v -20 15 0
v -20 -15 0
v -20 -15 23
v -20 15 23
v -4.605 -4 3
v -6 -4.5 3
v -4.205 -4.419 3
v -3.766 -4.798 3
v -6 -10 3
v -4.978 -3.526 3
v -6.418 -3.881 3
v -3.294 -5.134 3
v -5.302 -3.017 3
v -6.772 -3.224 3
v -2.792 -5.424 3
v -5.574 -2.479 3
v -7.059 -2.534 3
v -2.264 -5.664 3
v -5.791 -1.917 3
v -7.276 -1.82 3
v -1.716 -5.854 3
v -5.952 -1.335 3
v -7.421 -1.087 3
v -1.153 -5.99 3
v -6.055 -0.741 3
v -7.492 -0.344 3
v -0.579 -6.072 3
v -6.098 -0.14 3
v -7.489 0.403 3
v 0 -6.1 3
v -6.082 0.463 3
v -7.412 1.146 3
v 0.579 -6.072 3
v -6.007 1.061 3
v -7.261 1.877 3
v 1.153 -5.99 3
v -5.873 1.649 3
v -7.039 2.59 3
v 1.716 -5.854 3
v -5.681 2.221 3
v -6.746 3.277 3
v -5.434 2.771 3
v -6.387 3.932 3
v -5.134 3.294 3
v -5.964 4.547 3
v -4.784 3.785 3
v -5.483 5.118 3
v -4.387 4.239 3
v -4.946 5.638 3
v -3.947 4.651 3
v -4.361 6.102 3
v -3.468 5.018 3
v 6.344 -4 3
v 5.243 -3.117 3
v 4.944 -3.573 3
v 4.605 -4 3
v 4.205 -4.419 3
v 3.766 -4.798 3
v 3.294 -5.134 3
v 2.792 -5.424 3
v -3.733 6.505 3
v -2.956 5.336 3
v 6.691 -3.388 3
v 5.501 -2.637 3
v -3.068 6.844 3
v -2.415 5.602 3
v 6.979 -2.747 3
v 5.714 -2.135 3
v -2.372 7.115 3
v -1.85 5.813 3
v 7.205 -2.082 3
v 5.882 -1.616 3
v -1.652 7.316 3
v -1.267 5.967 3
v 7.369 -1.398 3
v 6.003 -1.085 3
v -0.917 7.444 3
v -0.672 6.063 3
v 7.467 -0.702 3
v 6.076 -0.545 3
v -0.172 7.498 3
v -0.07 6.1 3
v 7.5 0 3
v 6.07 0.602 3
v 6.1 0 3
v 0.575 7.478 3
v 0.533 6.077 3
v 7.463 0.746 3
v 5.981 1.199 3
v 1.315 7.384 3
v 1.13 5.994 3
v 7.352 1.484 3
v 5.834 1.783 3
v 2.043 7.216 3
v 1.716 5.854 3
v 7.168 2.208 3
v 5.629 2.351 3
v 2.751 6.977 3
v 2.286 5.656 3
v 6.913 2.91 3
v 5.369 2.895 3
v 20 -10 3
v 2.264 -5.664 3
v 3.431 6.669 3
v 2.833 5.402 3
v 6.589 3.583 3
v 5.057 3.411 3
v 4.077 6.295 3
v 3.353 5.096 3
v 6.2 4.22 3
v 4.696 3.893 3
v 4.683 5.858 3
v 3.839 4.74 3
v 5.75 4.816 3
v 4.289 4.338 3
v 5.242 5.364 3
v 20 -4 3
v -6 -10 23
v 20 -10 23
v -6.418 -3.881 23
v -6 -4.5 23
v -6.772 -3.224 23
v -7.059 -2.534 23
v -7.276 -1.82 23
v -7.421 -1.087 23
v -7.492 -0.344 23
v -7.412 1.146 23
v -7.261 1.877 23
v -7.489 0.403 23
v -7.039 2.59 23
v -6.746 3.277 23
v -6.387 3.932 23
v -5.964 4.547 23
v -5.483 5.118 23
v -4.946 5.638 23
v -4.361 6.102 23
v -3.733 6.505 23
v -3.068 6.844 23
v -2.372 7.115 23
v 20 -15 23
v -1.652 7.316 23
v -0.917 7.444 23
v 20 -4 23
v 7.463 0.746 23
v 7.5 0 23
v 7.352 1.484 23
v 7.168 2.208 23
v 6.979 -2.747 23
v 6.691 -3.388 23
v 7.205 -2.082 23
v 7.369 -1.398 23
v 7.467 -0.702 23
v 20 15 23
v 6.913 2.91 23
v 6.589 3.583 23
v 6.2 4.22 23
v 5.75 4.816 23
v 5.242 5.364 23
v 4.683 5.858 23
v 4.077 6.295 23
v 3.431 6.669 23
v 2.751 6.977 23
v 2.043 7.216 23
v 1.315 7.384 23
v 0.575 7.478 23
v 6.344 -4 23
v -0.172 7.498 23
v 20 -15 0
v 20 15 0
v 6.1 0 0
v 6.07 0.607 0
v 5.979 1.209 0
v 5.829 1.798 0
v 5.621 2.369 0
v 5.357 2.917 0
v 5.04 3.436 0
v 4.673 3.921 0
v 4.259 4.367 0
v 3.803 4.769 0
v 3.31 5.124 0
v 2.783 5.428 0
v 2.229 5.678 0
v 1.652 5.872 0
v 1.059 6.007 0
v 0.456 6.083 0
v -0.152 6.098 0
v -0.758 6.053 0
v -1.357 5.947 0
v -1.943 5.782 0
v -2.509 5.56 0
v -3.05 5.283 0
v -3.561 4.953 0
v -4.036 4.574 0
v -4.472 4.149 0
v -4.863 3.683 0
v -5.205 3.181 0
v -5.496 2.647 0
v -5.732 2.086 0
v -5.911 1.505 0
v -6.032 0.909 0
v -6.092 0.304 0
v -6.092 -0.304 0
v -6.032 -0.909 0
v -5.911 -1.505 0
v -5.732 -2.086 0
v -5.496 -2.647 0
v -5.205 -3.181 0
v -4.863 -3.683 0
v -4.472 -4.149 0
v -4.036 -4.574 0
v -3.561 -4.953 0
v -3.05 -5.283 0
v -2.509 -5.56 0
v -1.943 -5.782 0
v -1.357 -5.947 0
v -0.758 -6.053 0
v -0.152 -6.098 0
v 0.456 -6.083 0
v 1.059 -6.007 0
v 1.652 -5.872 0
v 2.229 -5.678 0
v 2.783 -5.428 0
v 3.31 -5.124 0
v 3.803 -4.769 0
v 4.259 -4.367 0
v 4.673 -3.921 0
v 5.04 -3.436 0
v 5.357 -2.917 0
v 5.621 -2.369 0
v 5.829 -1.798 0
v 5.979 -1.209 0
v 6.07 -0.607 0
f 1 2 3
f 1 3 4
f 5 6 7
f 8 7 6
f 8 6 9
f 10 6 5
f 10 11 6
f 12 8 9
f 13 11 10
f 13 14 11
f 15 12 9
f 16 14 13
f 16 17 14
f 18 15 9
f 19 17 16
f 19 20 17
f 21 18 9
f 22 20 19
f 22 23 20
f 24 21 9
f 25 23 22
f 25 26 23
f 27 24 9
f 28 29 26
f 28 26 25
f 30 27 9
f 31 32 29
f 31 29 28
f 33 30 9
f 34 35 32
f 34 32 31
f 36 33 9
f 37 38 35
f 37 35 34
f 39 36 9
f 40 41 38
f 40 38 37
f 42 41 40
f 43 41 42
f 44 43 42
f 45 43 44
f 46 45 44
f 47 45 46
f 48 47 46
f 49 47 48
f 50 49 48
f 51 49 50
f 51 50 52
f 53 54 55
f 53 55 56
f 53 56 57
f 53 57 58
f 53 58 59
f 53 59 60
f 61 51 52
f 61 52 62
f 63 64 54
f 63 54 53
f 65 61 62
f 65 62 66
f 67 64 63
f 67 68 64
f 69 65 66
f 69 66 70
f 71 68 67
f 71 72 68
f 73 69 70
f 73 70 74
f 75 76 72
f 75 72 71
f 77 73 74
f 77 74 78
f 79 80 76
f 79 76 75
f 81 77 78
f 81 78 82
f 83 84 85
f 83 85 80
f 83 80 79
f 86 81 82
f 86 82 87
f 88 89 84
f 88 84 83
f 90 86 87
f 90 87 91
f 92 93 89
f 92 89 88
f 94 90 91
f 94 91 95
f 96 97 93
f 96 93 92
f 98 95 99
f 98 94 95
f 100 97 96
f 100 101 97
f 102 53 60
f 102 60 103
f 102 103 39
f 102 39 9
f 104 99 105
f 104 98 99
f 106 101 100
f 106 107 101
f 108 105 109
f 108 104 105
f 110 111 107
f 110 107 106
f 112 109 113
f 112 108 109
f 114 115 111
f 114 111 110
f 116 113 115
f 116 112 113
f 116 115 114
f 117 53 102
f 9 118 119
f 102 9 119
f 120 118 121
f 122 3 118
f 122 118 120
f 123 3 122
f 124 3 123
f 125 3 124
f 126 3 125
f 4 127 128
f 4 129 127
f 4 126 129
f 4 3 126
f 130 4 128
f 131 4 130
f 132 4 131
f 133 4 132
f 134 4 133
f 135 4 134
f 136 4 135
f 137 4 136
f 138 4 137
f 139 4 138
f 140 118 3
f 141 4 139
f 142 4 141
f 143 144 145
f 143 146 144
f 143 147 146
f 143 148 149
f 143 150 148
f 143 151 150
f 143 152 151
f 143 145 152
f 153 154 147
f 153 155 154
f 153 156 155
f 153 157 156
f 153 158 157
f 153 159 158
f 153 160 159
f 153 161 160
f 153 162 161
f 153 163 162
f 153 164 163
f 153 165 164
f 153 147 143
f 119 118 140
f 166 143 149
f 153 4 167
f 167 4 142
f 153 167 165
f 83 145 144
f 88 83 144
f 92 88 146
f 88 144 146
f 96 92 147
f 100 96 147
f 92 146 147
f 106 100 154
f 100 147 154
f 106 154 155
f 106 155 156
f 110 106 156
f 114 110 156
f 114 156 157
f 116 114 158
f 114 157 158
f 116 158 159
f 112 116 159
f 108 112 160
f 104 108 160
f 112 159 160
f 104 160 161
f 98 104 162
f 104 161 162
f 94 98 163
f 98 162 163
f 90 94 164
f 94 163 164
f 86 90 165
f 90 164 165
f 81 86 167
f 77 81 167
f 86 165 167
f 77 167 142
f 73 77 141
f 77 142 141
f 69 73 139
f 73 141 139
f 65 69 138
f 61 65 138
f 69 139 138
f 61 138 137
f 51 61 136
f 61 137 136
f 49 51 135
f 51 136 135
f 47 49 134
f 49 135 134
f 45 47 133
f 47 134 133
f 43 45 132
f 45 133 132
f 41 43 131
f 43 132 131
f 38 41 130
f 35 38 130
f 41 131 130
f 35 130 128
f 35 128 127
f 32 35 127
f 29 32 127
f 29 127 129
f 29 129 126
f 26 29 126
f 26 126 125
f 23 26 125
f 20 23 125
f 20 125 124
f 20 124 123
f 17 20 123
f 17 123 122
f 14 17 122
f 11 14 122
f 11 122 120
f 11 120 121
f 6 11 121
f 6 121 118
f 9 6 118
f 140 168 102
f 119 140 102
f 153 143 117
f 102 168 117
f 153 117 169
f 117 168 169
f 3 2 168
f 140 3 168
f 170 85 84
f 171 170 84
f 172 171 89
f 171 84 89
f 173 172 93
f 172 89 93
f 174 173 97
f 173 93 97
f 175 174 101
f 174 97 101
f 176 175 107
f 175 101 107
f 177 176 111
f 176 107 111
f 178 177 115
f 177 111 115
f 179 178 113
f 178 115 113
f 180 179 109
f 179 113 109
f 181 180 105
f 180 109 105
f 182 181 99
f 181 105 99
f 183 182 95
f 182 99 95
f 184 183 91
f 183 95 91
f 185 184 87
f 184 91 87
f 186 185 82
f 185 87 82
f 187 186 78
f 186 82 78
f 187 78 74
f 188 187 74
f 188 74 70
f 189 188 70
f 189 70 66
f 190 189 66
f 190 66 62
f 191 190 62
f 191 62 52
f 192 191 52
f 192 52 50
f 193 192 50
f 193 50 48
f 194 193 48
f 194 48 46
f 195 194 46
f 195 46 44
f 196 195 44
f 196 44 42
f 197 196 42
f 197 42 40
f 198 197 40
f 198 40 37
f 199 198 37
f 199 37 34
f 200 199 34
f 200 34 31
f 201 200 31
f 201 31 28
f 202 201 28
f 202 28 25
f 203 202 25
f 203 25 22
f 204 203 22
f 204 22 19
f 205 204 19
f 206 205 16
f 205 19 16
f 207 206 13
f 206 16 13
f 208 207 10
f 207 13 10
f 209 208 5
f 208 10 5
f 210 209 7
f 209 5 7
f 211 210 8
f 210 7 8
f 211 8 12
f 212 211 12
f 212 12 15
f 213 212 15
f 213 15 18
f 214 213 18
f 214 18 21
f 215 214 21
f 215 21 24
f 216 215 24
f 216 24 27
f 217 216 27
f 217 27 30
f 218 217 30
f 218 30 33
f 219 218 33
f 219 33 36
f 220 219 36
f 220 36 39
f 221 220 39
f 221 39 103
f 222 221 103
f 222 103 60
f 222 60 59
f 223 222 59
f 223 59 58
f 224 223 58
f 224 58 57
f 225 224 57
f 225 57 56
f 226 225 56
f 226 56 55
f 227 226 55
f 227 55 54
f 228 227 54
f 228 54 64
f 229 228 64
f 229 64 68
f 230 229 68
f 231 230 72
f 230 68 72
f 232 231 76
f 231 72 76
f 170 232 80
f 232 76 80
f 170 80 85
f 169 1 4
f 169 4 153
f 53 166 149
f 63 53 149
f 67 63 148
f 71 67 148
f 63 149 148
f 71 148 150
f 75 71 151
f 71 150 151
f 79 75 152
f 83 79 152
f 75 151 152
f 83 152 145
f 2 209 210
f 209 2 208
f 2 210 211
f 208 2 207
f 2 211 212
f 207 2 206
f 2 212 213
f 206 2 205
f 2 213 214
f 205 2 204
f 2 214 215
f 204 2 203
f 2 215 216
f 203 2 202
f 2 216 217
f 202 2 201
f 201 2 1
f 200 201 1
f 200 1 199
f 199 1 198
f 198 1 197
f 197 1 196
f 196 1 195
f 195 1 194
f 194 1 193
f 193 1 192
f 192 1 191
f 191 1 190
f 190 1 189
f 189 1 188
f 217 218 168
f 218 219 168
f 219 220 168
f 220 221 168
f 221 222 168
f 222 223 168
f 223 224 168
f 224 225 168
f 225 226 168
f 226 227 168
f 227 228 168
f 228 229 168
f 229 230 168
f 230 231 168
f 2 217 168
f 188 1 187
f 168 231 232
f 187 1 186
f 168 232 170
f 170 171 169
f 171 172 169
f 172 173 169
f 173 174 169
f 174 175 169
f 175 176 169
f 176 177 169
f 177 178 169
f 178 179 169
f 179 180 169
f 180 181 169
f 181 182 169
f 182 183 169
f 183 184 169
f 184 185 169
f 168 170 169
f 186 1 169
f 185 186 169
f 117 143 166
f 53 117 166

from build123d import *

# Parameters (mm, degrees)
SKETCH1_W           = 40
SKETCH1_H           = 30
BOSS_EXTRUDE1_DEPTH = 23
SKETCH3_R           = 6.1
CUT_EXTRUDE1_DEPTH  = 24
CUT_EXTRUDE2_DEPTH  = 20


with BuildPart() as part:
    # Sketch1 → Boss-Extrude1 (new body)
    with BuildSketch(Plane.XY):
        Rectangle(SKETCH1_W, SKETCH1_H)
    extrude(amount=BOSS_EXTRUDE1_DEPTH)

    # Sketch3 → Cut-Extrude1 (cut, through all)
    with BuildSketch(Plane.XY.offset(23)):
        Circle(SKETCH3_R)
    extrude(amount=-CUT_EXTRUDE1_DEPTH, mode=Mode.SUBTRACT)

    # Sketch4 → Cut-Extrude2 (cut)
    with BuildSketch(Plane.XY.offset(23)):
        with BuildLine():
            Line((-6, -4.5), (-6, -4))
            Line((-6, -4), (-4.605431576, -4))
            ThreePointArc((-4.605431576, -4), (-2.135048874, 5.714154907), (6.1, 0))
            ThreePointArc((6.1, 0), (5.714154907, -2.135048874), (4.605431576, -4))
            Line((4.605431576, -4), (6.34428877, -4))
            ThreePointArc((6.34428877, -4), (7.205281597, -2.081806214), (7.5, 0))
            ThreePointArc((7.5, 0), (-2.371708245, 7.115124735), (-6, -4.5))
        make_face()
        with BuildLine():
            Line((-4.605431576, -4), (-6, -4))
            Line((-6, -4), (-6, -4.5))
            ThreePointArc((-6, -4.5), (0.303535318, -7.493855237), (6.34428877, -4))
            Line((6.34428877, -4), (4.605431576, -4))
            ThreePointArc((4.605431576, -4), (0, -6.1), (-4.605431576, -4))
        make_face()
        with BuildLine():
            ThreePointArc((6.34428877, -4), (0.303535318, -7.493855237), (-6, -4.5))
            Line((-6, -4.5), (-6, -10))
            Line((-6, -10), (20, -10))
            Line((20, -10), (20, -4))
            Line((20, -4), (6.34428877, -4))
        make_face()
    extrude(amount=-CUT_EXTRUDE2_DEPTH, mode=Mode.SUBTRACT)


solid = part.part
